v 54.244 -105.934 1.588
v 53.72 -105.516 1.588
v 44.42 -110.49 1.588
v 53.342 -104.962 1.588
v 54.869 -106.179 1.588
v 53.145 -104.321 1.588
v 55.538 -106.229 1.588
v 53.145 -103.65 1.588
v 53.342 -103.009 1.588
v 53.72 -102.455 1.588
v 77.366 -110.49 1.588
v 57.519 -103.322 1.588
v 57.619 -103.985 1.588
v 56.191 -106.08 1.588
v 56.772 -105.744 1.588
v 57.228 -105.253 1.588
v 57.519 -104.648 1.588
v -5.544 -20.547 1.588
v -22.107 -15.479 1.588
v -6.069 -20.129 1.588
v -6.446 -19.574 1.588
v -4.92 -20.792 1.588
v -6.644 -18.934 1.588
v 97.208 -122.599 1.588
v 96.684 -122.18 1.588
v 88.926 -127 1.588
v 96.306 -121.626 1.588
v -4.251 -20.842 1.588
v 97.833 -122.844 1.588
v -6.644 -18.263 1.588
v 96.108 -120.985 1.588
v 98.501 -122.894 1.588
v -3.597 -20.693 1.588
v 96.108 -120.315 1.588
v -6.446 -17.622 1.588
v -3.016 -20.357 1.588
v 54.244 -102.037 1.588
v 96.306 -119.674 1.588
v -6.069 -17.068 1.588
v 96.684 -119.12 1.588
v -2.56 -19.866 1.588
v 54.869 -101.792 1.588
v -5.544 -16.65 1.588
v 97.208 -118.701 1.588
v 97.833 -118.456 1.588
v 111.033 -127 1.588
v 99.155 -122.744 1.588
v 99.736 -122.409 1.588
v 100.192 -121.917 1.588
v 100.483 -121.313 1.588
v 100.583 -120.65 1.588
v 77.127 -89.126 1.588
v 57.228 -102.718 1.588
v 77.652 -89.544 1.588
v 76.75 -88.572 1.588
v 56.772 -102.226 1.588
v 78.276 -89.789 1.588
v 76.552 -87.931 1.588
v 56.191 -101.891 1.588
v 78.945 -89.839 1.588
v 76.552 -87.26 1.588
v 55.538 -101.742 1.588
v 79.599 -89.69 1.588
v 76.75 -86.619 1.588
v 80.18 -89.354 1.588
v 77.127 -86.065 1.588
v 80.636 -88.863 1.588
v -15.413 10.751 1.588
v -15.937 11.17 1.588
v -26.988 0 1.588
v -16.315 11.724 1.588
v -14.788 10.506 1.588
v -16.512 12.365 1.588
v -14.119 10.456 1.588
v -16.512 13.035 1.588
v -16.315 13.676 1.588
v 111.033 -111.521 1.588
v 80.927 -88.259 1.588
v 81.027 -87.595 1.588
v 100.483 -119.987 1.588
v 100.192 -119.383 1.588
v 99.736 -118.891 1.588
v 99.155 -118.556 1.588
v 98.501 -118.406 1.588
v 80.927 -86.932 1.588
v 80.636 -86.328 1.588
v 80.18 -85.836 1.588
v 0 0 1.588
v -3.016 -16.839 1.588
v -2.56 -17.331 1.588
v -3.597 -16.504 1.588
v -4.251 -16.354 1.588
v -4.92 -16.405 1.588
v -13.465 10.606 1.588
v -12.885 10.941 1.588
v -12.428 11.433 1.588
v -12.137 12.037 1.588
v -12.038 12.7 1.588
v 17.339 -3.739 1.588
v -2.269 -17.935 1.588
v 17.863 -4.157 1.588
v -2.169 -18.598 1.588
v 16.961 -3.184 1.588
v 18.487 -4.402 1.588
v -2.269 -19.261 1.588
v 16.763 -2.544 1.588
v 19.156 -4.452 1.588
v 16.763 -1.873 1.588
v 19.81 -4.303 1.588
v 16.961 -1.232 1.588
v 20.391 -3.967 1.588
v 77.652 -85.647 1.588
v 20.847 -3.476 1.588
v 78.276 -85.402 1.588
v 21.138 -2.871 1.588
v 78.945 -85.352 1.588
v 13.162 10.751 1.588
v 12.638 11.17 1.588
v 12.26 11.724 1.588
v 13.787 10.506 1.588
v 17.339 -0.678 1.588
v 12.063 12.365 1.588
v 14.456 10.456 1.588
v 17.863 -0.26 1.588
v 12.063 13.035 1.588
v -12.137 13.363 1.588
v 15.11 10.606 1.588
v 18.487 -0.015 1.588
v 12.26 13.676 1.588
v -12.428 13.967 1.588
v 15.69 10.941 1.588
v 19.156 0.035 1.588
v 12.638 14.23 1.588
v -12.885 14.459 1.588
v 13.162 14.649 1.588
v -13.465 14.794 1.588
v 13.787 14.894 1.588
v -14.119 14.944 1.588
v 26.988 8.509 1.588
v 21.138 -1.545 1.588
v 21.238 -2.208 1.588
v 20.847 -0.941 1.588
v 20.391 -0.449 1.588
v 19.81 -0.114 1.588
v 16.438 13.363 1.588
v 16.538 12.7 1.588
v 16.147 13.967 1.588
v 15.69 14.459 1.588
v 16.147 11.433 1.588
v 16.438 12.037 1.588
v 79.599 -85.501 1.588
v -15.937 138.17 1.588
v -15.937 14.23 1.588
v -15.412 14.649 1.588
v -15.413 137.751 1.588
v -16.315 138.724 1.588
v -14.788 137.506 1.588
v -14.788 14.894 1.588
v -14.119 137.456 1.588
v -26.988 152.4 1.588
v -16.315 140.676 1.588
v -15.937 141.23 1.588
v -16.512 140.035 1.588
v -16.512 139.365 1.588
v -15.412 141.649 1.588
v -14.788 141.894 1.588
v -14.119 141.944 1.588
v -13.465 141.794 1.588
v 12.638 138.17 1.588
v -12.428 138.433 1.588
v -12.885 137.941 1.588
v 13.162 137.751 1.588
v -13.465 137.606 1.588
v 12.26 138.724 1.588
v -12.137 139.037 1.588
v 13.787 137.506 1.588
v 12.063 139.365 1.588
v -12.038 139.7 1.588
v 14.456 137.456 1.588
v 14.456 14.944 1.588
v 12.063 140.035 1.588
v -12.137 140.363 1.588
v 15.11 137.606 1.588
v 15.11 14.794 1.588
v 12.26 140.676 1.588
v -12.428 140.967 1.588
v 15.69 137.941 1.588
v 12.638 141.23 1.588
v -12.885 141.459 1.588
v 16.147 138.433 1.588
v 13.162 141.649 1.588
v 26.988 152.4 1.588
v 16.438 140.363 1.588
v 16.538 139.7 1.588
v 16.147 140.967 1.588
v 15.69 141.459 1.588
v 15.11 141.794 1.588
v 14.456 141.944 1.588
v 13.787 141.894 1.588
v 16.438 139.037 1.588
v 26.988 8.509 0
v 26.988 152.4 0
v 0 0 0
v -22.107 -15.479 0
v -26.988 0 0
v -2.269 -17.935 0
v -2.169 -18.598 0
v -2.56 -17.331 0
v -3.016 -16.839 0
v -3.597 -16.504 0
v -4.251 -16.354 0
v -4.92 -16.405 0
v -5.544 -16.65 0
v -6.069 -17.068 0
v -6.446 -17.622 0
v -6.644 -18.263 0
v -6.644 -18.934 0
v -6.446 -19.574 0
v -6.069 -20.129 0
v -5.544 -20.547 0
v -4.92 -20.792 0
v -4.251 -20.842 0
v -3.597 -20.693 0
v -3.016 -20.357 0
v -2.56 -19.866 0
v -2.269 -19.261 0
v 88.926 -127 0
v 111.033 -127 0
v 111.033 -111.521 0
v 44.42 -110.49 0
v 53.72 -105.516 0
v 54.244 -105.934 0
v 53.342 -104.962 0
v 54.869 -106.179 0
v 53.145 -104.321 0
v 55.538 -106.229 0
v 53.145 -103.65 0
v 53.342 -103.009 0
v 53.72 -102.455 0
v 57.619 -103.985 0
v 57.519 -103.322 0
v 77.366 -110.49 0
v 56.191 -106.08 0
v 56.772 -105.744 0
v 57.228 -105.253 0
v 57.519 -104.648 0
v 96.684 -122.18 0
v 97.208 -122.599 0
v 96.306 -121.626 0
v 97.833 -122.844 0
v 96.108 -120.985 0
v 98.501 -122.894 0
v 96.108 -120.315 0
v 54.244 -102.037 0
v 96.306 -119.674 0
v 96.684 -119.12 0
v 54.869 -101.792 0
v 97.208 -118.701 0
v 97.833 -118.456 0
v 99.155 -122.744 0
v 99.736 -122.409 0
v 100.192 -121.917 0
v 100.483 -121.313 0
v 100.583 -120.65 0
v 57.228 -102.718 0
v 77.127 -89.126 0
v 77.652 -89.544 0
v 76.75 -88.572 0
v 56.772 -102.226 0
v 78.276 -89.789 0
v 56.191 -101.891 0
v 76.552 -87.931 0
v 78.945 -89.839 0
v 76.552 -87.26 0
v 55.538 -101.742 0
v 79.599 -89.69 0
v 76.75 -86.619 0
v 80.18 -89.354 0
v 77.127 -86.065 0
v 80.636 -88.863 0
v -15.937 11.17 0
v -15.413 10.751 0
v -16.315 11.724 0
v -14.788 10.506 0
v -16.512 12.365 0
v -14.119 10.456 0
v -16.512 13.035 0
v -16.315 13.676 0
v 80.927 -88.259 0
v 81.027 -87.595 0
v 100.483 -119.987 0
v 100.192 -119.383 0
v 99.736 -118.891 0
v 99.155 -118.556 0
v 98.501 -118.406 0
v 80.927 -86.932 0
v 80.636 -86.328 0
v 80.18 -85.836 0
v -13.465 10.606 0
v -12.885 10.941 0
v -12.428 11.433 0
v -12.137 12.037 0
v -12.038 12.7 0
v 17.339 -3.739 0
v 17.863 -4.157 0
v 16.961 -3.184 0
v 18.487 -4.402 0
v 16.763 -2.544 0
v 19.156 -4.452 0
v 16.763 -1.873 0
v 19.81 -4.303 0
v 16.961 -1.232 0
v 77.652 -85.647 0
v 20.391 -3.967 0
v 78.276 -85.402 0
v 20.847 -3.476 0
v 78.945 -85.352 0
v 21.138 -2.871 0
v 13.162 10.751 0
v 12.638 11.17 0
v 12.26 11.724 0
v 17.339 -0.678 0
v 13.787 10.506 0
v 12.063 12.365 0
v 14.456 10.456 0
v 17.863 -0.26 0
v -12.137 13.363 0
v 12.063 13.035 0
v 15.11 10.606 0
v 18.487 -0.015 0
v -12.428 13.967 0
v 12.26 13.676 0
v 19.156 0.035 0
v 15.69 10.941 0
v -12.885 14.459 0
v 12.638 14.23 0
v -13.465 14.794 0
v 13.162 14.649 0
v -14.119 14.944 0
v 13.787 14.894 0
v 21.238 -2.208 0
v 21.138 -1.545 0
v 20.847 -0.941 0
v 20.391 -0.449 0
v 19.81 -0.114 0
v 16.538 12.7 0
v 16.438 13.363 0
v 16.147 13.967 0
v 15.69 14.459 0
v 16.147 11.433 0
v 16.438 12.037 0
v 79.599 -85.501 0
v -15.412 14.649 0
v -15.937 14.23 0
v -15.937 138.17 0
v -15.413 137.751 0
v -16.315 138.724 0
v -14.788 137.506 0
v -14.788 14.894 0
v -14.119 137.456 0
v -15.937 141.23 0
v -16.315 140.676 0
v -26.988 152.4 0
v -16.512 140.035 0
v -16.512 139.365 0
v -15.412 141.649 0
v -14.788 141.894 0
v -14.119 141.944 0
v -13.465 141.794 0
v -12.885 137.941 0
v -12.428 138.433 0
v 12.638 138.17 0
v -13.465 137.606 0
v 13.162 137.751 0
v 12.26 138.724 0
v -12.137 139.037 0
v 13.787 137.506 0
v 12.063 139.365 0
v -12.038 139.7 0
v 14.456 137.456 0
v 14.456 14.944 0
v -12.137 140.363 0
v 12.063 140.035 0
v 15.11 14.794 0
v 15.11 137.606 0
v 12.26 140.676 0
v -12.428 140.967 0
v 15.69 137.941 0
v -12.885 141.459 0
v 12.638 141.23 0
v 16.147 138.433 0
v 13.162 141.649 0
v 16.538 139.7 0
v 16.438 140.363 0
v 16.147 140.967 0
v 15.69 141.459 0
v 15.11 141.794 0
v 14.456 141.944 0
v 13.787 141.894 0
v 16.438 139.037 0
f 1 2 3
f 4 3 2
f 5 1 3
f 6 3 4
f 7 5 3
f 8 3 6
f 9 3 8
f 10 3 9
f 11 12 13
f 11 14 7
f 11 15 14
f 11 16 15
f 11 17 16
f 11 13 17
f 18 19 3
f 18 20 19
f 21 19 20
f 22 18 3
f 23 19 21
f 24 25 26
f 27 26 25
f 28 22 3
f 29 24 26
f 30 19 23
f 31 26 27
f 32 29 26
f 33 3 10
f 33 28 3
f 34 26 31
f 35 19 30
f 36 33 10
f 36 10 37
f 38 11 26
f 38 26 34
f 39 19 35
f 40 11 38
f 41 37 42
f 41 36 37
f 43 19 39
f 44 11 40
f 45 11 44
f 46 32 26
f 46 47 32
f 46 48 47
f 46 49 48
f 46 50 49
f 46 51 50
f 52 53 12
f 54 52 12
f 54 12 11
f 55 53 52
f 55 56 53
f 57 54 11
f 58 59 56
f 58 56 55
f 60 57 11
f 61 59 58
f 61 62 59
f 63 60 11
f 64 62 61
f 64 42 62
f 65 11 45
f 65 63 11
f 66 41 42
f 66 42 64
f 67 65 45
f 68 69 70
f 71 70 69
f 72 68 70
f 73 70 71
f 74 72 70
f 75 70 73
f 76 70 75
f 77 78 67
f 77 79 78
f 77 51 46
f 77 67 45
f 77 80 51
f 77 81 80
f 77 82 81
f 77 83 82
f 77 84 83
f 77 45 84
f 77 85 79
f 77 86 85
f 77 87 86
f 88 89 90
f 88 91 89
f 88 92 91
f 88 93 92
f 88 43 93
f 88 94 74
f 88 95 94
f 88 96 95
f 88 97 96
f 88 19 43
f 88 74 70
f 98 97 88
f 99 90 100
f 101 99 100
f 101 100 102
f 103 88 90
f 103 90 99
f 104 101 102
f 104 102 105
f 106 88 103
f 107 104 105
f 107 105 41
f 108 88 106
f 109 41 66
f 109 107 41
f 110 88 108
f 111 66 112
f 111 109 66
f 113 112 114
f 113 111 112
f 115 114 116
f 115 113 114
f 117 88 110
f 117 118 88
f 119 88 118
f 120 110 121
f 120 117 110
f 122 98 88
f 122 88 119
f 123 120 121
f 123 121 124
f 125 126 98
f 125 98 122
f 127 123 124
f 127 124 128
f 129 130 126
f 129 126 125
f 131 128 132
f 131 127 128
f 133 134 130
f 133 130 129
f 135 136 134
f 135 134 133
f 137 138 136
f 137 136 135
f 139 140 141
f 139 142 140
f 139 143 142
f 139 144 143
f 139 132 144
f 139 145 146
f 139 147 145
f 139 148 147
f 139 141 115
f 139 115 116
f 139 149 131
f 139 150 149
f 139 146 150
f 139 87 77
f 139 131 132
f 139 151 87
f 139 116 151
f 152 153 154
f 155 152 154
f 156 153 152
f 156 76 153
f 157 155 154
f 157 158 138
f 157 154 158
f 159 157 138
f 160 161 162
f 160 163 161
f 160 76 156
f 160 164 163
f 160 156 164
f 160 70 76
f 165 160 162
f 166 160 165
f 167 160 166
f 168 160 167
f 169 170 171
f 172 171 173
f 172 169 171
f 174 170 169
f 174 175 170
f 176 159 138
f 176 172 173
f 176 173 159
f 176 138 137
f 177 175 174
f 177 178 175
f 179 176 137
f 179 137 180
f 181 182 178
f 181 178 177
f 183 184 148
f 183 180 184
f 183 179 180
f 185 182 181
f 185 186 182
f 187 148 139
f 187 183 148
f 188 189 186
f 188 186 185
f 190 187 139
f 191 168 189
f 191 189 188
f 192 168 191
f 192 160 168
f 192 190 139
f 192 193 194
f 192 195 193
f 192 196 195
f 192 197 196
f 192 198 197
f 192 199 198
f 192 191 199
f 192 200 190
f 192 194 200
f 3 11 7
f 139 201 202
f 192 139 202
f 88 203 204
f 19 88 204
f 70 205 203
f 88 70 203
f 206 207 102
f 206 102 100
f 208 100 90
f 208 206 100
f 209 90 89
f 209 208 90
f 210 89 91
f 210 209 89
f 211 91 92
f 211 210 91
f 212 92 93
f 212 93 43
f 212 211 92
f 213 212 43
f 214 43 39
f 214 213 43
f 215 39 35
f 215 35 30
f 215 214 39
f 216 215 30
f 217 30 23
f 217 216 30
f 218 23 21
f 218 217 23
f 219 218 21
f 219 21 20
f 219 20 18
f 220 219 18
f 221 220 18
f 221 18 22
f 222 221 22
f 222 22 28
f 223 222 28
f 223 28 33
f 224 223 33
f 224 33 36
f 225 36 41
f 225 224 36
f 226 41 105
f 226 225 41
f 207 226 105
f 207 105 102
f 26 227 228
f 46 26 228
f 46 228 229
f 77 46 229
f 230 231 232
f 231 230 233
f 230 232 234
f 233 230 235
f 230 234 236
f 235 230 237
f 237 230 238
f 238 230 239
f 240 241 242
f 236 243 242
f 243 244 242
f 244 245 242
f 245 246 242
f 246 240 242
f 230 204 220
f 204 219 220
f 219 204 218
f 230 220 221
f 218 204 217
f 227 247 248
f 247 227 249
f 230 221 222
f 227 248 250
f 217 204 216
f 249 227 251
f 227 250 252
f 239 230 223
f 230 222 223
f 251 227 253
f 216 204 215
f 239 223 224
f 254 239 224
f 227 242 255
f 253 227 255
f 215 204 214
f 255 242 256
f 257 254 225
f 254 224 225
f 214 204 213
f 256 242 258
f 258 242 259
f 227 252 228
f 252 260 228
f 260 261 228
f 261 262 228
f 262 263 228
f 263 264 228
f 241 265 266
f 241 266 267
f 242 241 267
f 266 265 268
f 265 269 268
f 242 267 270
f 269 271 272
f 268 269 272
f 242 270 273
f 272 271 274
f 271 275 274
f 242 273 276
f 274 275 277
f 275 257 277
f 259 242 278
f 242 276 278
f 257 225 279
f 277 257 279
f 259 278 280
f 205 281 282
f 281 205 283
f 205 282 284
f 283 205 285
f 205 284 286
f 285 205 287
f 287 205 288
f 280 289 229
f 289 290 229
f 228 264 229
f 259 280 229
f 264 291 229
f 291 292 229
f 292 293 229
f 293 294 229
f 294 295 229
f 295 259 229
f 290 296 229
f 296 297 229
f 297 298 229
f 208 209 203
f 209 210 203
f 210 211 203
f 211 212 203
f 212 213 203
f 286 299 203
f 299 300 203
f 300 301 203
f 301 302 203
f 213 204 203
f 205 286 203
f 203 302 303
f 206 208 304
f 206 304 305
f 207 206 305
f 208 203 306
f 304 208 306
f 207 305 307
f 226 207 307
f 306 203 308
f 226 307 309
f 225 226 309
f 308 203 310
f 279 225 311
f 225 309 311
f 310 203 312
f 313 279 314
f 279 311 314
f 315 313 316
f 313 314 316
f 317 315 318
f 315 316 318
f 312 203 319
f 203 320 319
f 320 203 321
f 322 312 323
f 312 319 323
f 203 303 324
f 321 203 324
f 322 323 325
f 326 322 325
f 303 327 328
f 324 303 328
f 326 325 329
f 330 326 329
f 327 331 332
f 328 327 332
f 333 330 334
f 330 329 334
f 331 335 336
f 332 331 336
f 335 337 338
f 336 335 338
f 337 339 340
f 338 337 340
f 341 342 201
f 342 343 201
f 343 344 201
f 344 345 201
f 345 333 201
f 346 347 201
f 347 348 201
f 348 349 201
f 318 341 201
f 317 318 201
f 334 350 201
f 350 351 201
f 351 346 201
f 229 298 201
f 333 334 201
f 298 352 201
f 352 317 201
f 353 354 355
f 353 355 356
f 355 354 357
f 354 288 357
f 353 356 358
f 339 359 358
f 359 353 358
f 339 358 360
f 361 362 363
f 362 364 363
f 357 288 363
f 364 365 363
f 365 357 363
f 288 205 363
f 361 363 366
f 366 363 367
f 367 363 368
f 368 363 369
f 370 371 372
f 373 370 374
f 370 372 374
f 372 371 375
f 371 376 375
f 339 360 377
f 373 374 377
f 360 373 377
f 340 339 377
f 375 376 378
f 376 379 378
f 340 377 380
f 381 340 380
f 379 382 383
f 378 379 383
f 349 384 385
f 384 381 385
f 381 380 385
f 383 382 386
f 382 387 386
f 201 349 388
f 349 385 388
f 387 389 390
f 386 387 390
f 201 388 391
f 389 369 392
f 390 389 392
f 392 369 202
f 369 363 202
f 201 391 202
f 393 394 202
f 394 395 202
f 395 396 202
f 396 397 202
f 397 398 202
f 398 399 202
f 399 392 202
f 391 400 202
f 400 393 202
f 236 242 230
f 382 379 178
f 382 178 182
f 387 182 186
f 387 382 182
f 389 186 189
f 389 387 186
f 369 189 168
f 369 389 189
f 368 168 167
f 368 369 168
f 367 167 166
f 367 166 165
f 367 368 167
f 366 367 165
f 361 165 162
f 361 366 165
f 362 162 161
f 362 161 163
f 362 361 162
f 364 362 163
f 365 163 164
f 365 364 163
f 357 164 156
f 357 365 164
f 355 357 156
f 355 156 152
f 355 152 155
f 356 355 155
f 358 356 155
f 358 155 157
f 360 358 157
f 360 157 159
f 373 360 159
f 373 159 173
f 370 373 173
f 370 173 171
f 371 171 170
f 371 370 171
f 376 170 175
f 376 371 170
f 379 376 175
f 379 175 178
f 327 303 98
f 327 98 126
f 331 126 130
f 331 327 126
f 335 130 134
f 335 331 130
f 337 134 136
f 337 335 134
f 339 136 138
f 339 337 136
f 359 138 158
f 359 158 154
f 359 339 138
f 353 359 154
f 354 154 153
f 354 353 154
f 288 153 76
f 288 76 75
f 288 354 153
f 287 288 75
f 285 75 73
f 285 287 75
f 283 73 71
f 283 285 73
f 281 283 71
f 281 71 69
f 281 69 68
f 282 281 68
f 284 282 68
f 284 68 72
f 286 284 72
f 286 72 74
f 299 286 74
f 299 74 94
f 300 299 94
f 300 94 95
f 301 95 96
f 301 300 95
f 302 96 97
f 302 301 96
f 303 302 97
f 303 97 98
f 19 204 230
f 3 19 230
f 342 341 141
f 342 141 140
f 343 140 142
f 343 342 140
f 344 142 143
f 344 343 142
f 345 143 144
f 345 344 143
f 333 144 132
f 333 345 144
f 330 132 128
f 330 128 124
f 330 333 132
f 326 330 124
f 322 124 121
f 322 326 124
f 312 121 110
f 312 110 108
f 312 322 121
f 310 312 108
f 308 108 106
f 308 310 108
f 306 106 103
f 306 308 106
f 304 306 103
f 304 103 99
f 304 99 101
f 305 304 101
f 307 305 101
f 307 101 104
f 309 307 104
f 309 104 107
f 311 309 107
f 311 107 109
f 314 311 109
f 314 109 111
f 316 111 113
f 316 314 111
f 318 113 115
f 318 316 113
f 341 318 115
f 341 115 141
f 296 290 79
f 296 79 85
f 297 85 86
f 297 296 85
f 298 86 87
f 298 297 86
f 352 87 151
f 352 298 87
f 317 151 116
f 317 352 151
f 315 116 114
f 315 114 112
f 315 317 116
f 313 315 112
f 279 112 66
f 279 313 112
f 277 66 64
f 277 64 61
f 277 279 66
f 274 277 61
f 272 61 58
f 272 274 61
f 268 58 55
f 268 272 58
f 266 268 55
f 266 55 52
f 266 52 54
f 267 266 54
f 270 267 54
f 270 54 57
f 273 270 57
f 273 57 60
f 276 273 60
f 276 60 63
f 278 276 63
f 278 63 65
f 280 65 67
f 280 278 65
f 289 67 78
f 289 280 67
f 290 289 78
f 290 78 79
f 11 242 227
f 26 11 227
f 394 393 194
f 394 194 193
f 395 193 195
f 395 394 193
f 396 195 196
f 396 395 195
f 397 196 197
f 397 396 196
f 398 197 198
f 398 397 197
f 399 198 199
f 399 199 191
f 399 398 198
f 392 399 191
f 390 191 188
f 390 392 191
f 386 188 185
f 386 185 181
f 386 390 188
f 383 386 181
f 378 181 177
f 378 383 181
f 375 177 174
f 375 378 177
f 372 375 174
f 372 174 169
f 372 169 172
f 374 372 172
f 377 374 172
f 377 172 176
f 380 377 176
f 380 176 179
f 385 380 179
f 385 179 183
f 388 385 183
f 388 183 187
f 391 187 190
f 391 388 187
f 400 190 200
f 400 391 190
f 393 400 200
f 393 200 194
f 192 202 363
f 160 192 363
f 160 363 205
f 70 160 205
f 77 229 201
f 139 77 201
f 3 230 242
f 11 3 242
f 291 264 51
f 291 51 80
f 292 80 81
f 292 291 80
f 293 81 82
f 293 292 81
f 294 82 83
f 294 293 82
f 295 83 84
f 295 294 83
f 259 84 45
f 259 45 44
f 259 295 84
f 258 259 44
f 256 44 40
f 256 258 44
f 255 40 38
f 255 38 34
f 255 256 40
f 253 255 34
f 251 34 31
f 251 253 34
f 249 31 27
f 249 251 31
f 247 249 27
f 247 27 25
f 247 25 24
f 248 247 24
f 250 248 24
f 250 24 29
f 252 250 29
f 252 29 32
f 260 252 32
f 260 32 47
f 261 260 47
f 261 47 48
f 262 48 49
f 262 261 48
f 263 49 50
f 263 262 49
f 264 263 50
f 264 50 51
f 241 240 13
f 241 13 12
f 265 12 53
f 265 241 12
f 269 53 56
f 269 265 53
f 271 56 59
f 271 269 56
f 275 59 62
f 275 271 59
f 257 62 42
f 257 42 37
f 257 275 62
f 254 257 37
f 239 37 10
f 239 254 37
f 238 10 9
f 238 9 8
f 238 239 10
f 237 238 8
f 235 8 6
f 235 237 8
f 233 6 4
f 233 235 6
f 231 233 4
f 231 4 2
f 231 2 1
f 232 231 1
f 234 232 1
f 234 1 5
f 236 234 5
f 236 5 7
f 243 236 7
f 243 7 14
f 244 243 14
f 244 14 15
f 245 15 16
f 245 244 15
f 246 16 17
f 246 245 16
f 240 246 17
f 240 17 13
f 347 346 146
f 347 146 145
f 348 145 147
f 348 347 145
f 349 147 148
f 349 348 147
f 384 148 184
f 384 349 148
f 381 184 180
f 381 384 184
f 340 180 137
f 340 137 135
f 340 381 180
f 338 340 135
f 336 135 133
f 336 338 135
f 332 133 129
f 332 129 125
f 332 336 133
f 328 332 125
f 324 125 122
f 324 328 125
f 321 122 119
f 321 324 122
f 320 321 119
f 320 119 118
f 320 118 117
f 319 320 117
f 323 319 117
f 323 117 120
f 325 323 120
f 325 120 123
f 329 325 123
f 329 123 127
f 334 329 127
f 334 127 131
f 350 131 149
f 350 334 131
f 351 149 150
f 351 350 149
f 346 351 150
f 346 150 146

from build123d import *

# Parameters (mm, degrees)
SKETCH1_R           = 2.25
BOSS_EXTRUDE1_DEPTH = 1.5875


with BuildPart() as part:
    # Sketch1 → Boss-Extrude1 (new body)
    with BuildSketch(Plane.XY):
        Polygon((-26.9875, 0), (0, 0), (-22.106865795, -15.479394076), (44.420276683, -110.49), (77.365930897, -110.49), (88.926357353, -127), (111.033223148, -127), (111.033223148, -111.520605924), (26.9875, 8.509126065), (26.9875, 152.4), (-26.9875, 152.4), align=None)
        with Locations((98.333223148, -120.65)):
            Circle(SKETCH1_R, mode=Mode.SUBTRACT)
        with Locations((-14.2875, 12.7)):
            Circle(SKETCH1_R, mode=Mode.SUBTRACT)
        with Locations((-14.2875, 139.7)):
            Circle(SKETCH1_R, mode=Mode.SUBTRACT)
        with Locations((14.2875, 139.7)):
            Circle(SKETCH1_R, mode=Mode.SUBTRACT)
        with Locations((14.2875, 12.7)):
            Circle(SKETCH1_R, mode=Mode.SUBTRACT)
        with Locations((78.77672996, -87.595333778)):
            Circle(SKETCH1_R, mode=Mode.SUBTRACT)
        with Locations((18.988055574, -2.208257628)):
            Circle(SKETCH1_R, mode=Mode.SUBTRACT)
        with Locations((55.369460295, -103.985280447)):
            Circle(SKETCH1_R, mode=Mode.SUBTRACT)
        with Locations((-4.419214091, -18.598204297)):
            Circle(SKETCH1_R, mode=Mode.SUBTRACT)
    extrude(amount=BOSS_EXTRUDE1_DEPTH)


solid = part.part
